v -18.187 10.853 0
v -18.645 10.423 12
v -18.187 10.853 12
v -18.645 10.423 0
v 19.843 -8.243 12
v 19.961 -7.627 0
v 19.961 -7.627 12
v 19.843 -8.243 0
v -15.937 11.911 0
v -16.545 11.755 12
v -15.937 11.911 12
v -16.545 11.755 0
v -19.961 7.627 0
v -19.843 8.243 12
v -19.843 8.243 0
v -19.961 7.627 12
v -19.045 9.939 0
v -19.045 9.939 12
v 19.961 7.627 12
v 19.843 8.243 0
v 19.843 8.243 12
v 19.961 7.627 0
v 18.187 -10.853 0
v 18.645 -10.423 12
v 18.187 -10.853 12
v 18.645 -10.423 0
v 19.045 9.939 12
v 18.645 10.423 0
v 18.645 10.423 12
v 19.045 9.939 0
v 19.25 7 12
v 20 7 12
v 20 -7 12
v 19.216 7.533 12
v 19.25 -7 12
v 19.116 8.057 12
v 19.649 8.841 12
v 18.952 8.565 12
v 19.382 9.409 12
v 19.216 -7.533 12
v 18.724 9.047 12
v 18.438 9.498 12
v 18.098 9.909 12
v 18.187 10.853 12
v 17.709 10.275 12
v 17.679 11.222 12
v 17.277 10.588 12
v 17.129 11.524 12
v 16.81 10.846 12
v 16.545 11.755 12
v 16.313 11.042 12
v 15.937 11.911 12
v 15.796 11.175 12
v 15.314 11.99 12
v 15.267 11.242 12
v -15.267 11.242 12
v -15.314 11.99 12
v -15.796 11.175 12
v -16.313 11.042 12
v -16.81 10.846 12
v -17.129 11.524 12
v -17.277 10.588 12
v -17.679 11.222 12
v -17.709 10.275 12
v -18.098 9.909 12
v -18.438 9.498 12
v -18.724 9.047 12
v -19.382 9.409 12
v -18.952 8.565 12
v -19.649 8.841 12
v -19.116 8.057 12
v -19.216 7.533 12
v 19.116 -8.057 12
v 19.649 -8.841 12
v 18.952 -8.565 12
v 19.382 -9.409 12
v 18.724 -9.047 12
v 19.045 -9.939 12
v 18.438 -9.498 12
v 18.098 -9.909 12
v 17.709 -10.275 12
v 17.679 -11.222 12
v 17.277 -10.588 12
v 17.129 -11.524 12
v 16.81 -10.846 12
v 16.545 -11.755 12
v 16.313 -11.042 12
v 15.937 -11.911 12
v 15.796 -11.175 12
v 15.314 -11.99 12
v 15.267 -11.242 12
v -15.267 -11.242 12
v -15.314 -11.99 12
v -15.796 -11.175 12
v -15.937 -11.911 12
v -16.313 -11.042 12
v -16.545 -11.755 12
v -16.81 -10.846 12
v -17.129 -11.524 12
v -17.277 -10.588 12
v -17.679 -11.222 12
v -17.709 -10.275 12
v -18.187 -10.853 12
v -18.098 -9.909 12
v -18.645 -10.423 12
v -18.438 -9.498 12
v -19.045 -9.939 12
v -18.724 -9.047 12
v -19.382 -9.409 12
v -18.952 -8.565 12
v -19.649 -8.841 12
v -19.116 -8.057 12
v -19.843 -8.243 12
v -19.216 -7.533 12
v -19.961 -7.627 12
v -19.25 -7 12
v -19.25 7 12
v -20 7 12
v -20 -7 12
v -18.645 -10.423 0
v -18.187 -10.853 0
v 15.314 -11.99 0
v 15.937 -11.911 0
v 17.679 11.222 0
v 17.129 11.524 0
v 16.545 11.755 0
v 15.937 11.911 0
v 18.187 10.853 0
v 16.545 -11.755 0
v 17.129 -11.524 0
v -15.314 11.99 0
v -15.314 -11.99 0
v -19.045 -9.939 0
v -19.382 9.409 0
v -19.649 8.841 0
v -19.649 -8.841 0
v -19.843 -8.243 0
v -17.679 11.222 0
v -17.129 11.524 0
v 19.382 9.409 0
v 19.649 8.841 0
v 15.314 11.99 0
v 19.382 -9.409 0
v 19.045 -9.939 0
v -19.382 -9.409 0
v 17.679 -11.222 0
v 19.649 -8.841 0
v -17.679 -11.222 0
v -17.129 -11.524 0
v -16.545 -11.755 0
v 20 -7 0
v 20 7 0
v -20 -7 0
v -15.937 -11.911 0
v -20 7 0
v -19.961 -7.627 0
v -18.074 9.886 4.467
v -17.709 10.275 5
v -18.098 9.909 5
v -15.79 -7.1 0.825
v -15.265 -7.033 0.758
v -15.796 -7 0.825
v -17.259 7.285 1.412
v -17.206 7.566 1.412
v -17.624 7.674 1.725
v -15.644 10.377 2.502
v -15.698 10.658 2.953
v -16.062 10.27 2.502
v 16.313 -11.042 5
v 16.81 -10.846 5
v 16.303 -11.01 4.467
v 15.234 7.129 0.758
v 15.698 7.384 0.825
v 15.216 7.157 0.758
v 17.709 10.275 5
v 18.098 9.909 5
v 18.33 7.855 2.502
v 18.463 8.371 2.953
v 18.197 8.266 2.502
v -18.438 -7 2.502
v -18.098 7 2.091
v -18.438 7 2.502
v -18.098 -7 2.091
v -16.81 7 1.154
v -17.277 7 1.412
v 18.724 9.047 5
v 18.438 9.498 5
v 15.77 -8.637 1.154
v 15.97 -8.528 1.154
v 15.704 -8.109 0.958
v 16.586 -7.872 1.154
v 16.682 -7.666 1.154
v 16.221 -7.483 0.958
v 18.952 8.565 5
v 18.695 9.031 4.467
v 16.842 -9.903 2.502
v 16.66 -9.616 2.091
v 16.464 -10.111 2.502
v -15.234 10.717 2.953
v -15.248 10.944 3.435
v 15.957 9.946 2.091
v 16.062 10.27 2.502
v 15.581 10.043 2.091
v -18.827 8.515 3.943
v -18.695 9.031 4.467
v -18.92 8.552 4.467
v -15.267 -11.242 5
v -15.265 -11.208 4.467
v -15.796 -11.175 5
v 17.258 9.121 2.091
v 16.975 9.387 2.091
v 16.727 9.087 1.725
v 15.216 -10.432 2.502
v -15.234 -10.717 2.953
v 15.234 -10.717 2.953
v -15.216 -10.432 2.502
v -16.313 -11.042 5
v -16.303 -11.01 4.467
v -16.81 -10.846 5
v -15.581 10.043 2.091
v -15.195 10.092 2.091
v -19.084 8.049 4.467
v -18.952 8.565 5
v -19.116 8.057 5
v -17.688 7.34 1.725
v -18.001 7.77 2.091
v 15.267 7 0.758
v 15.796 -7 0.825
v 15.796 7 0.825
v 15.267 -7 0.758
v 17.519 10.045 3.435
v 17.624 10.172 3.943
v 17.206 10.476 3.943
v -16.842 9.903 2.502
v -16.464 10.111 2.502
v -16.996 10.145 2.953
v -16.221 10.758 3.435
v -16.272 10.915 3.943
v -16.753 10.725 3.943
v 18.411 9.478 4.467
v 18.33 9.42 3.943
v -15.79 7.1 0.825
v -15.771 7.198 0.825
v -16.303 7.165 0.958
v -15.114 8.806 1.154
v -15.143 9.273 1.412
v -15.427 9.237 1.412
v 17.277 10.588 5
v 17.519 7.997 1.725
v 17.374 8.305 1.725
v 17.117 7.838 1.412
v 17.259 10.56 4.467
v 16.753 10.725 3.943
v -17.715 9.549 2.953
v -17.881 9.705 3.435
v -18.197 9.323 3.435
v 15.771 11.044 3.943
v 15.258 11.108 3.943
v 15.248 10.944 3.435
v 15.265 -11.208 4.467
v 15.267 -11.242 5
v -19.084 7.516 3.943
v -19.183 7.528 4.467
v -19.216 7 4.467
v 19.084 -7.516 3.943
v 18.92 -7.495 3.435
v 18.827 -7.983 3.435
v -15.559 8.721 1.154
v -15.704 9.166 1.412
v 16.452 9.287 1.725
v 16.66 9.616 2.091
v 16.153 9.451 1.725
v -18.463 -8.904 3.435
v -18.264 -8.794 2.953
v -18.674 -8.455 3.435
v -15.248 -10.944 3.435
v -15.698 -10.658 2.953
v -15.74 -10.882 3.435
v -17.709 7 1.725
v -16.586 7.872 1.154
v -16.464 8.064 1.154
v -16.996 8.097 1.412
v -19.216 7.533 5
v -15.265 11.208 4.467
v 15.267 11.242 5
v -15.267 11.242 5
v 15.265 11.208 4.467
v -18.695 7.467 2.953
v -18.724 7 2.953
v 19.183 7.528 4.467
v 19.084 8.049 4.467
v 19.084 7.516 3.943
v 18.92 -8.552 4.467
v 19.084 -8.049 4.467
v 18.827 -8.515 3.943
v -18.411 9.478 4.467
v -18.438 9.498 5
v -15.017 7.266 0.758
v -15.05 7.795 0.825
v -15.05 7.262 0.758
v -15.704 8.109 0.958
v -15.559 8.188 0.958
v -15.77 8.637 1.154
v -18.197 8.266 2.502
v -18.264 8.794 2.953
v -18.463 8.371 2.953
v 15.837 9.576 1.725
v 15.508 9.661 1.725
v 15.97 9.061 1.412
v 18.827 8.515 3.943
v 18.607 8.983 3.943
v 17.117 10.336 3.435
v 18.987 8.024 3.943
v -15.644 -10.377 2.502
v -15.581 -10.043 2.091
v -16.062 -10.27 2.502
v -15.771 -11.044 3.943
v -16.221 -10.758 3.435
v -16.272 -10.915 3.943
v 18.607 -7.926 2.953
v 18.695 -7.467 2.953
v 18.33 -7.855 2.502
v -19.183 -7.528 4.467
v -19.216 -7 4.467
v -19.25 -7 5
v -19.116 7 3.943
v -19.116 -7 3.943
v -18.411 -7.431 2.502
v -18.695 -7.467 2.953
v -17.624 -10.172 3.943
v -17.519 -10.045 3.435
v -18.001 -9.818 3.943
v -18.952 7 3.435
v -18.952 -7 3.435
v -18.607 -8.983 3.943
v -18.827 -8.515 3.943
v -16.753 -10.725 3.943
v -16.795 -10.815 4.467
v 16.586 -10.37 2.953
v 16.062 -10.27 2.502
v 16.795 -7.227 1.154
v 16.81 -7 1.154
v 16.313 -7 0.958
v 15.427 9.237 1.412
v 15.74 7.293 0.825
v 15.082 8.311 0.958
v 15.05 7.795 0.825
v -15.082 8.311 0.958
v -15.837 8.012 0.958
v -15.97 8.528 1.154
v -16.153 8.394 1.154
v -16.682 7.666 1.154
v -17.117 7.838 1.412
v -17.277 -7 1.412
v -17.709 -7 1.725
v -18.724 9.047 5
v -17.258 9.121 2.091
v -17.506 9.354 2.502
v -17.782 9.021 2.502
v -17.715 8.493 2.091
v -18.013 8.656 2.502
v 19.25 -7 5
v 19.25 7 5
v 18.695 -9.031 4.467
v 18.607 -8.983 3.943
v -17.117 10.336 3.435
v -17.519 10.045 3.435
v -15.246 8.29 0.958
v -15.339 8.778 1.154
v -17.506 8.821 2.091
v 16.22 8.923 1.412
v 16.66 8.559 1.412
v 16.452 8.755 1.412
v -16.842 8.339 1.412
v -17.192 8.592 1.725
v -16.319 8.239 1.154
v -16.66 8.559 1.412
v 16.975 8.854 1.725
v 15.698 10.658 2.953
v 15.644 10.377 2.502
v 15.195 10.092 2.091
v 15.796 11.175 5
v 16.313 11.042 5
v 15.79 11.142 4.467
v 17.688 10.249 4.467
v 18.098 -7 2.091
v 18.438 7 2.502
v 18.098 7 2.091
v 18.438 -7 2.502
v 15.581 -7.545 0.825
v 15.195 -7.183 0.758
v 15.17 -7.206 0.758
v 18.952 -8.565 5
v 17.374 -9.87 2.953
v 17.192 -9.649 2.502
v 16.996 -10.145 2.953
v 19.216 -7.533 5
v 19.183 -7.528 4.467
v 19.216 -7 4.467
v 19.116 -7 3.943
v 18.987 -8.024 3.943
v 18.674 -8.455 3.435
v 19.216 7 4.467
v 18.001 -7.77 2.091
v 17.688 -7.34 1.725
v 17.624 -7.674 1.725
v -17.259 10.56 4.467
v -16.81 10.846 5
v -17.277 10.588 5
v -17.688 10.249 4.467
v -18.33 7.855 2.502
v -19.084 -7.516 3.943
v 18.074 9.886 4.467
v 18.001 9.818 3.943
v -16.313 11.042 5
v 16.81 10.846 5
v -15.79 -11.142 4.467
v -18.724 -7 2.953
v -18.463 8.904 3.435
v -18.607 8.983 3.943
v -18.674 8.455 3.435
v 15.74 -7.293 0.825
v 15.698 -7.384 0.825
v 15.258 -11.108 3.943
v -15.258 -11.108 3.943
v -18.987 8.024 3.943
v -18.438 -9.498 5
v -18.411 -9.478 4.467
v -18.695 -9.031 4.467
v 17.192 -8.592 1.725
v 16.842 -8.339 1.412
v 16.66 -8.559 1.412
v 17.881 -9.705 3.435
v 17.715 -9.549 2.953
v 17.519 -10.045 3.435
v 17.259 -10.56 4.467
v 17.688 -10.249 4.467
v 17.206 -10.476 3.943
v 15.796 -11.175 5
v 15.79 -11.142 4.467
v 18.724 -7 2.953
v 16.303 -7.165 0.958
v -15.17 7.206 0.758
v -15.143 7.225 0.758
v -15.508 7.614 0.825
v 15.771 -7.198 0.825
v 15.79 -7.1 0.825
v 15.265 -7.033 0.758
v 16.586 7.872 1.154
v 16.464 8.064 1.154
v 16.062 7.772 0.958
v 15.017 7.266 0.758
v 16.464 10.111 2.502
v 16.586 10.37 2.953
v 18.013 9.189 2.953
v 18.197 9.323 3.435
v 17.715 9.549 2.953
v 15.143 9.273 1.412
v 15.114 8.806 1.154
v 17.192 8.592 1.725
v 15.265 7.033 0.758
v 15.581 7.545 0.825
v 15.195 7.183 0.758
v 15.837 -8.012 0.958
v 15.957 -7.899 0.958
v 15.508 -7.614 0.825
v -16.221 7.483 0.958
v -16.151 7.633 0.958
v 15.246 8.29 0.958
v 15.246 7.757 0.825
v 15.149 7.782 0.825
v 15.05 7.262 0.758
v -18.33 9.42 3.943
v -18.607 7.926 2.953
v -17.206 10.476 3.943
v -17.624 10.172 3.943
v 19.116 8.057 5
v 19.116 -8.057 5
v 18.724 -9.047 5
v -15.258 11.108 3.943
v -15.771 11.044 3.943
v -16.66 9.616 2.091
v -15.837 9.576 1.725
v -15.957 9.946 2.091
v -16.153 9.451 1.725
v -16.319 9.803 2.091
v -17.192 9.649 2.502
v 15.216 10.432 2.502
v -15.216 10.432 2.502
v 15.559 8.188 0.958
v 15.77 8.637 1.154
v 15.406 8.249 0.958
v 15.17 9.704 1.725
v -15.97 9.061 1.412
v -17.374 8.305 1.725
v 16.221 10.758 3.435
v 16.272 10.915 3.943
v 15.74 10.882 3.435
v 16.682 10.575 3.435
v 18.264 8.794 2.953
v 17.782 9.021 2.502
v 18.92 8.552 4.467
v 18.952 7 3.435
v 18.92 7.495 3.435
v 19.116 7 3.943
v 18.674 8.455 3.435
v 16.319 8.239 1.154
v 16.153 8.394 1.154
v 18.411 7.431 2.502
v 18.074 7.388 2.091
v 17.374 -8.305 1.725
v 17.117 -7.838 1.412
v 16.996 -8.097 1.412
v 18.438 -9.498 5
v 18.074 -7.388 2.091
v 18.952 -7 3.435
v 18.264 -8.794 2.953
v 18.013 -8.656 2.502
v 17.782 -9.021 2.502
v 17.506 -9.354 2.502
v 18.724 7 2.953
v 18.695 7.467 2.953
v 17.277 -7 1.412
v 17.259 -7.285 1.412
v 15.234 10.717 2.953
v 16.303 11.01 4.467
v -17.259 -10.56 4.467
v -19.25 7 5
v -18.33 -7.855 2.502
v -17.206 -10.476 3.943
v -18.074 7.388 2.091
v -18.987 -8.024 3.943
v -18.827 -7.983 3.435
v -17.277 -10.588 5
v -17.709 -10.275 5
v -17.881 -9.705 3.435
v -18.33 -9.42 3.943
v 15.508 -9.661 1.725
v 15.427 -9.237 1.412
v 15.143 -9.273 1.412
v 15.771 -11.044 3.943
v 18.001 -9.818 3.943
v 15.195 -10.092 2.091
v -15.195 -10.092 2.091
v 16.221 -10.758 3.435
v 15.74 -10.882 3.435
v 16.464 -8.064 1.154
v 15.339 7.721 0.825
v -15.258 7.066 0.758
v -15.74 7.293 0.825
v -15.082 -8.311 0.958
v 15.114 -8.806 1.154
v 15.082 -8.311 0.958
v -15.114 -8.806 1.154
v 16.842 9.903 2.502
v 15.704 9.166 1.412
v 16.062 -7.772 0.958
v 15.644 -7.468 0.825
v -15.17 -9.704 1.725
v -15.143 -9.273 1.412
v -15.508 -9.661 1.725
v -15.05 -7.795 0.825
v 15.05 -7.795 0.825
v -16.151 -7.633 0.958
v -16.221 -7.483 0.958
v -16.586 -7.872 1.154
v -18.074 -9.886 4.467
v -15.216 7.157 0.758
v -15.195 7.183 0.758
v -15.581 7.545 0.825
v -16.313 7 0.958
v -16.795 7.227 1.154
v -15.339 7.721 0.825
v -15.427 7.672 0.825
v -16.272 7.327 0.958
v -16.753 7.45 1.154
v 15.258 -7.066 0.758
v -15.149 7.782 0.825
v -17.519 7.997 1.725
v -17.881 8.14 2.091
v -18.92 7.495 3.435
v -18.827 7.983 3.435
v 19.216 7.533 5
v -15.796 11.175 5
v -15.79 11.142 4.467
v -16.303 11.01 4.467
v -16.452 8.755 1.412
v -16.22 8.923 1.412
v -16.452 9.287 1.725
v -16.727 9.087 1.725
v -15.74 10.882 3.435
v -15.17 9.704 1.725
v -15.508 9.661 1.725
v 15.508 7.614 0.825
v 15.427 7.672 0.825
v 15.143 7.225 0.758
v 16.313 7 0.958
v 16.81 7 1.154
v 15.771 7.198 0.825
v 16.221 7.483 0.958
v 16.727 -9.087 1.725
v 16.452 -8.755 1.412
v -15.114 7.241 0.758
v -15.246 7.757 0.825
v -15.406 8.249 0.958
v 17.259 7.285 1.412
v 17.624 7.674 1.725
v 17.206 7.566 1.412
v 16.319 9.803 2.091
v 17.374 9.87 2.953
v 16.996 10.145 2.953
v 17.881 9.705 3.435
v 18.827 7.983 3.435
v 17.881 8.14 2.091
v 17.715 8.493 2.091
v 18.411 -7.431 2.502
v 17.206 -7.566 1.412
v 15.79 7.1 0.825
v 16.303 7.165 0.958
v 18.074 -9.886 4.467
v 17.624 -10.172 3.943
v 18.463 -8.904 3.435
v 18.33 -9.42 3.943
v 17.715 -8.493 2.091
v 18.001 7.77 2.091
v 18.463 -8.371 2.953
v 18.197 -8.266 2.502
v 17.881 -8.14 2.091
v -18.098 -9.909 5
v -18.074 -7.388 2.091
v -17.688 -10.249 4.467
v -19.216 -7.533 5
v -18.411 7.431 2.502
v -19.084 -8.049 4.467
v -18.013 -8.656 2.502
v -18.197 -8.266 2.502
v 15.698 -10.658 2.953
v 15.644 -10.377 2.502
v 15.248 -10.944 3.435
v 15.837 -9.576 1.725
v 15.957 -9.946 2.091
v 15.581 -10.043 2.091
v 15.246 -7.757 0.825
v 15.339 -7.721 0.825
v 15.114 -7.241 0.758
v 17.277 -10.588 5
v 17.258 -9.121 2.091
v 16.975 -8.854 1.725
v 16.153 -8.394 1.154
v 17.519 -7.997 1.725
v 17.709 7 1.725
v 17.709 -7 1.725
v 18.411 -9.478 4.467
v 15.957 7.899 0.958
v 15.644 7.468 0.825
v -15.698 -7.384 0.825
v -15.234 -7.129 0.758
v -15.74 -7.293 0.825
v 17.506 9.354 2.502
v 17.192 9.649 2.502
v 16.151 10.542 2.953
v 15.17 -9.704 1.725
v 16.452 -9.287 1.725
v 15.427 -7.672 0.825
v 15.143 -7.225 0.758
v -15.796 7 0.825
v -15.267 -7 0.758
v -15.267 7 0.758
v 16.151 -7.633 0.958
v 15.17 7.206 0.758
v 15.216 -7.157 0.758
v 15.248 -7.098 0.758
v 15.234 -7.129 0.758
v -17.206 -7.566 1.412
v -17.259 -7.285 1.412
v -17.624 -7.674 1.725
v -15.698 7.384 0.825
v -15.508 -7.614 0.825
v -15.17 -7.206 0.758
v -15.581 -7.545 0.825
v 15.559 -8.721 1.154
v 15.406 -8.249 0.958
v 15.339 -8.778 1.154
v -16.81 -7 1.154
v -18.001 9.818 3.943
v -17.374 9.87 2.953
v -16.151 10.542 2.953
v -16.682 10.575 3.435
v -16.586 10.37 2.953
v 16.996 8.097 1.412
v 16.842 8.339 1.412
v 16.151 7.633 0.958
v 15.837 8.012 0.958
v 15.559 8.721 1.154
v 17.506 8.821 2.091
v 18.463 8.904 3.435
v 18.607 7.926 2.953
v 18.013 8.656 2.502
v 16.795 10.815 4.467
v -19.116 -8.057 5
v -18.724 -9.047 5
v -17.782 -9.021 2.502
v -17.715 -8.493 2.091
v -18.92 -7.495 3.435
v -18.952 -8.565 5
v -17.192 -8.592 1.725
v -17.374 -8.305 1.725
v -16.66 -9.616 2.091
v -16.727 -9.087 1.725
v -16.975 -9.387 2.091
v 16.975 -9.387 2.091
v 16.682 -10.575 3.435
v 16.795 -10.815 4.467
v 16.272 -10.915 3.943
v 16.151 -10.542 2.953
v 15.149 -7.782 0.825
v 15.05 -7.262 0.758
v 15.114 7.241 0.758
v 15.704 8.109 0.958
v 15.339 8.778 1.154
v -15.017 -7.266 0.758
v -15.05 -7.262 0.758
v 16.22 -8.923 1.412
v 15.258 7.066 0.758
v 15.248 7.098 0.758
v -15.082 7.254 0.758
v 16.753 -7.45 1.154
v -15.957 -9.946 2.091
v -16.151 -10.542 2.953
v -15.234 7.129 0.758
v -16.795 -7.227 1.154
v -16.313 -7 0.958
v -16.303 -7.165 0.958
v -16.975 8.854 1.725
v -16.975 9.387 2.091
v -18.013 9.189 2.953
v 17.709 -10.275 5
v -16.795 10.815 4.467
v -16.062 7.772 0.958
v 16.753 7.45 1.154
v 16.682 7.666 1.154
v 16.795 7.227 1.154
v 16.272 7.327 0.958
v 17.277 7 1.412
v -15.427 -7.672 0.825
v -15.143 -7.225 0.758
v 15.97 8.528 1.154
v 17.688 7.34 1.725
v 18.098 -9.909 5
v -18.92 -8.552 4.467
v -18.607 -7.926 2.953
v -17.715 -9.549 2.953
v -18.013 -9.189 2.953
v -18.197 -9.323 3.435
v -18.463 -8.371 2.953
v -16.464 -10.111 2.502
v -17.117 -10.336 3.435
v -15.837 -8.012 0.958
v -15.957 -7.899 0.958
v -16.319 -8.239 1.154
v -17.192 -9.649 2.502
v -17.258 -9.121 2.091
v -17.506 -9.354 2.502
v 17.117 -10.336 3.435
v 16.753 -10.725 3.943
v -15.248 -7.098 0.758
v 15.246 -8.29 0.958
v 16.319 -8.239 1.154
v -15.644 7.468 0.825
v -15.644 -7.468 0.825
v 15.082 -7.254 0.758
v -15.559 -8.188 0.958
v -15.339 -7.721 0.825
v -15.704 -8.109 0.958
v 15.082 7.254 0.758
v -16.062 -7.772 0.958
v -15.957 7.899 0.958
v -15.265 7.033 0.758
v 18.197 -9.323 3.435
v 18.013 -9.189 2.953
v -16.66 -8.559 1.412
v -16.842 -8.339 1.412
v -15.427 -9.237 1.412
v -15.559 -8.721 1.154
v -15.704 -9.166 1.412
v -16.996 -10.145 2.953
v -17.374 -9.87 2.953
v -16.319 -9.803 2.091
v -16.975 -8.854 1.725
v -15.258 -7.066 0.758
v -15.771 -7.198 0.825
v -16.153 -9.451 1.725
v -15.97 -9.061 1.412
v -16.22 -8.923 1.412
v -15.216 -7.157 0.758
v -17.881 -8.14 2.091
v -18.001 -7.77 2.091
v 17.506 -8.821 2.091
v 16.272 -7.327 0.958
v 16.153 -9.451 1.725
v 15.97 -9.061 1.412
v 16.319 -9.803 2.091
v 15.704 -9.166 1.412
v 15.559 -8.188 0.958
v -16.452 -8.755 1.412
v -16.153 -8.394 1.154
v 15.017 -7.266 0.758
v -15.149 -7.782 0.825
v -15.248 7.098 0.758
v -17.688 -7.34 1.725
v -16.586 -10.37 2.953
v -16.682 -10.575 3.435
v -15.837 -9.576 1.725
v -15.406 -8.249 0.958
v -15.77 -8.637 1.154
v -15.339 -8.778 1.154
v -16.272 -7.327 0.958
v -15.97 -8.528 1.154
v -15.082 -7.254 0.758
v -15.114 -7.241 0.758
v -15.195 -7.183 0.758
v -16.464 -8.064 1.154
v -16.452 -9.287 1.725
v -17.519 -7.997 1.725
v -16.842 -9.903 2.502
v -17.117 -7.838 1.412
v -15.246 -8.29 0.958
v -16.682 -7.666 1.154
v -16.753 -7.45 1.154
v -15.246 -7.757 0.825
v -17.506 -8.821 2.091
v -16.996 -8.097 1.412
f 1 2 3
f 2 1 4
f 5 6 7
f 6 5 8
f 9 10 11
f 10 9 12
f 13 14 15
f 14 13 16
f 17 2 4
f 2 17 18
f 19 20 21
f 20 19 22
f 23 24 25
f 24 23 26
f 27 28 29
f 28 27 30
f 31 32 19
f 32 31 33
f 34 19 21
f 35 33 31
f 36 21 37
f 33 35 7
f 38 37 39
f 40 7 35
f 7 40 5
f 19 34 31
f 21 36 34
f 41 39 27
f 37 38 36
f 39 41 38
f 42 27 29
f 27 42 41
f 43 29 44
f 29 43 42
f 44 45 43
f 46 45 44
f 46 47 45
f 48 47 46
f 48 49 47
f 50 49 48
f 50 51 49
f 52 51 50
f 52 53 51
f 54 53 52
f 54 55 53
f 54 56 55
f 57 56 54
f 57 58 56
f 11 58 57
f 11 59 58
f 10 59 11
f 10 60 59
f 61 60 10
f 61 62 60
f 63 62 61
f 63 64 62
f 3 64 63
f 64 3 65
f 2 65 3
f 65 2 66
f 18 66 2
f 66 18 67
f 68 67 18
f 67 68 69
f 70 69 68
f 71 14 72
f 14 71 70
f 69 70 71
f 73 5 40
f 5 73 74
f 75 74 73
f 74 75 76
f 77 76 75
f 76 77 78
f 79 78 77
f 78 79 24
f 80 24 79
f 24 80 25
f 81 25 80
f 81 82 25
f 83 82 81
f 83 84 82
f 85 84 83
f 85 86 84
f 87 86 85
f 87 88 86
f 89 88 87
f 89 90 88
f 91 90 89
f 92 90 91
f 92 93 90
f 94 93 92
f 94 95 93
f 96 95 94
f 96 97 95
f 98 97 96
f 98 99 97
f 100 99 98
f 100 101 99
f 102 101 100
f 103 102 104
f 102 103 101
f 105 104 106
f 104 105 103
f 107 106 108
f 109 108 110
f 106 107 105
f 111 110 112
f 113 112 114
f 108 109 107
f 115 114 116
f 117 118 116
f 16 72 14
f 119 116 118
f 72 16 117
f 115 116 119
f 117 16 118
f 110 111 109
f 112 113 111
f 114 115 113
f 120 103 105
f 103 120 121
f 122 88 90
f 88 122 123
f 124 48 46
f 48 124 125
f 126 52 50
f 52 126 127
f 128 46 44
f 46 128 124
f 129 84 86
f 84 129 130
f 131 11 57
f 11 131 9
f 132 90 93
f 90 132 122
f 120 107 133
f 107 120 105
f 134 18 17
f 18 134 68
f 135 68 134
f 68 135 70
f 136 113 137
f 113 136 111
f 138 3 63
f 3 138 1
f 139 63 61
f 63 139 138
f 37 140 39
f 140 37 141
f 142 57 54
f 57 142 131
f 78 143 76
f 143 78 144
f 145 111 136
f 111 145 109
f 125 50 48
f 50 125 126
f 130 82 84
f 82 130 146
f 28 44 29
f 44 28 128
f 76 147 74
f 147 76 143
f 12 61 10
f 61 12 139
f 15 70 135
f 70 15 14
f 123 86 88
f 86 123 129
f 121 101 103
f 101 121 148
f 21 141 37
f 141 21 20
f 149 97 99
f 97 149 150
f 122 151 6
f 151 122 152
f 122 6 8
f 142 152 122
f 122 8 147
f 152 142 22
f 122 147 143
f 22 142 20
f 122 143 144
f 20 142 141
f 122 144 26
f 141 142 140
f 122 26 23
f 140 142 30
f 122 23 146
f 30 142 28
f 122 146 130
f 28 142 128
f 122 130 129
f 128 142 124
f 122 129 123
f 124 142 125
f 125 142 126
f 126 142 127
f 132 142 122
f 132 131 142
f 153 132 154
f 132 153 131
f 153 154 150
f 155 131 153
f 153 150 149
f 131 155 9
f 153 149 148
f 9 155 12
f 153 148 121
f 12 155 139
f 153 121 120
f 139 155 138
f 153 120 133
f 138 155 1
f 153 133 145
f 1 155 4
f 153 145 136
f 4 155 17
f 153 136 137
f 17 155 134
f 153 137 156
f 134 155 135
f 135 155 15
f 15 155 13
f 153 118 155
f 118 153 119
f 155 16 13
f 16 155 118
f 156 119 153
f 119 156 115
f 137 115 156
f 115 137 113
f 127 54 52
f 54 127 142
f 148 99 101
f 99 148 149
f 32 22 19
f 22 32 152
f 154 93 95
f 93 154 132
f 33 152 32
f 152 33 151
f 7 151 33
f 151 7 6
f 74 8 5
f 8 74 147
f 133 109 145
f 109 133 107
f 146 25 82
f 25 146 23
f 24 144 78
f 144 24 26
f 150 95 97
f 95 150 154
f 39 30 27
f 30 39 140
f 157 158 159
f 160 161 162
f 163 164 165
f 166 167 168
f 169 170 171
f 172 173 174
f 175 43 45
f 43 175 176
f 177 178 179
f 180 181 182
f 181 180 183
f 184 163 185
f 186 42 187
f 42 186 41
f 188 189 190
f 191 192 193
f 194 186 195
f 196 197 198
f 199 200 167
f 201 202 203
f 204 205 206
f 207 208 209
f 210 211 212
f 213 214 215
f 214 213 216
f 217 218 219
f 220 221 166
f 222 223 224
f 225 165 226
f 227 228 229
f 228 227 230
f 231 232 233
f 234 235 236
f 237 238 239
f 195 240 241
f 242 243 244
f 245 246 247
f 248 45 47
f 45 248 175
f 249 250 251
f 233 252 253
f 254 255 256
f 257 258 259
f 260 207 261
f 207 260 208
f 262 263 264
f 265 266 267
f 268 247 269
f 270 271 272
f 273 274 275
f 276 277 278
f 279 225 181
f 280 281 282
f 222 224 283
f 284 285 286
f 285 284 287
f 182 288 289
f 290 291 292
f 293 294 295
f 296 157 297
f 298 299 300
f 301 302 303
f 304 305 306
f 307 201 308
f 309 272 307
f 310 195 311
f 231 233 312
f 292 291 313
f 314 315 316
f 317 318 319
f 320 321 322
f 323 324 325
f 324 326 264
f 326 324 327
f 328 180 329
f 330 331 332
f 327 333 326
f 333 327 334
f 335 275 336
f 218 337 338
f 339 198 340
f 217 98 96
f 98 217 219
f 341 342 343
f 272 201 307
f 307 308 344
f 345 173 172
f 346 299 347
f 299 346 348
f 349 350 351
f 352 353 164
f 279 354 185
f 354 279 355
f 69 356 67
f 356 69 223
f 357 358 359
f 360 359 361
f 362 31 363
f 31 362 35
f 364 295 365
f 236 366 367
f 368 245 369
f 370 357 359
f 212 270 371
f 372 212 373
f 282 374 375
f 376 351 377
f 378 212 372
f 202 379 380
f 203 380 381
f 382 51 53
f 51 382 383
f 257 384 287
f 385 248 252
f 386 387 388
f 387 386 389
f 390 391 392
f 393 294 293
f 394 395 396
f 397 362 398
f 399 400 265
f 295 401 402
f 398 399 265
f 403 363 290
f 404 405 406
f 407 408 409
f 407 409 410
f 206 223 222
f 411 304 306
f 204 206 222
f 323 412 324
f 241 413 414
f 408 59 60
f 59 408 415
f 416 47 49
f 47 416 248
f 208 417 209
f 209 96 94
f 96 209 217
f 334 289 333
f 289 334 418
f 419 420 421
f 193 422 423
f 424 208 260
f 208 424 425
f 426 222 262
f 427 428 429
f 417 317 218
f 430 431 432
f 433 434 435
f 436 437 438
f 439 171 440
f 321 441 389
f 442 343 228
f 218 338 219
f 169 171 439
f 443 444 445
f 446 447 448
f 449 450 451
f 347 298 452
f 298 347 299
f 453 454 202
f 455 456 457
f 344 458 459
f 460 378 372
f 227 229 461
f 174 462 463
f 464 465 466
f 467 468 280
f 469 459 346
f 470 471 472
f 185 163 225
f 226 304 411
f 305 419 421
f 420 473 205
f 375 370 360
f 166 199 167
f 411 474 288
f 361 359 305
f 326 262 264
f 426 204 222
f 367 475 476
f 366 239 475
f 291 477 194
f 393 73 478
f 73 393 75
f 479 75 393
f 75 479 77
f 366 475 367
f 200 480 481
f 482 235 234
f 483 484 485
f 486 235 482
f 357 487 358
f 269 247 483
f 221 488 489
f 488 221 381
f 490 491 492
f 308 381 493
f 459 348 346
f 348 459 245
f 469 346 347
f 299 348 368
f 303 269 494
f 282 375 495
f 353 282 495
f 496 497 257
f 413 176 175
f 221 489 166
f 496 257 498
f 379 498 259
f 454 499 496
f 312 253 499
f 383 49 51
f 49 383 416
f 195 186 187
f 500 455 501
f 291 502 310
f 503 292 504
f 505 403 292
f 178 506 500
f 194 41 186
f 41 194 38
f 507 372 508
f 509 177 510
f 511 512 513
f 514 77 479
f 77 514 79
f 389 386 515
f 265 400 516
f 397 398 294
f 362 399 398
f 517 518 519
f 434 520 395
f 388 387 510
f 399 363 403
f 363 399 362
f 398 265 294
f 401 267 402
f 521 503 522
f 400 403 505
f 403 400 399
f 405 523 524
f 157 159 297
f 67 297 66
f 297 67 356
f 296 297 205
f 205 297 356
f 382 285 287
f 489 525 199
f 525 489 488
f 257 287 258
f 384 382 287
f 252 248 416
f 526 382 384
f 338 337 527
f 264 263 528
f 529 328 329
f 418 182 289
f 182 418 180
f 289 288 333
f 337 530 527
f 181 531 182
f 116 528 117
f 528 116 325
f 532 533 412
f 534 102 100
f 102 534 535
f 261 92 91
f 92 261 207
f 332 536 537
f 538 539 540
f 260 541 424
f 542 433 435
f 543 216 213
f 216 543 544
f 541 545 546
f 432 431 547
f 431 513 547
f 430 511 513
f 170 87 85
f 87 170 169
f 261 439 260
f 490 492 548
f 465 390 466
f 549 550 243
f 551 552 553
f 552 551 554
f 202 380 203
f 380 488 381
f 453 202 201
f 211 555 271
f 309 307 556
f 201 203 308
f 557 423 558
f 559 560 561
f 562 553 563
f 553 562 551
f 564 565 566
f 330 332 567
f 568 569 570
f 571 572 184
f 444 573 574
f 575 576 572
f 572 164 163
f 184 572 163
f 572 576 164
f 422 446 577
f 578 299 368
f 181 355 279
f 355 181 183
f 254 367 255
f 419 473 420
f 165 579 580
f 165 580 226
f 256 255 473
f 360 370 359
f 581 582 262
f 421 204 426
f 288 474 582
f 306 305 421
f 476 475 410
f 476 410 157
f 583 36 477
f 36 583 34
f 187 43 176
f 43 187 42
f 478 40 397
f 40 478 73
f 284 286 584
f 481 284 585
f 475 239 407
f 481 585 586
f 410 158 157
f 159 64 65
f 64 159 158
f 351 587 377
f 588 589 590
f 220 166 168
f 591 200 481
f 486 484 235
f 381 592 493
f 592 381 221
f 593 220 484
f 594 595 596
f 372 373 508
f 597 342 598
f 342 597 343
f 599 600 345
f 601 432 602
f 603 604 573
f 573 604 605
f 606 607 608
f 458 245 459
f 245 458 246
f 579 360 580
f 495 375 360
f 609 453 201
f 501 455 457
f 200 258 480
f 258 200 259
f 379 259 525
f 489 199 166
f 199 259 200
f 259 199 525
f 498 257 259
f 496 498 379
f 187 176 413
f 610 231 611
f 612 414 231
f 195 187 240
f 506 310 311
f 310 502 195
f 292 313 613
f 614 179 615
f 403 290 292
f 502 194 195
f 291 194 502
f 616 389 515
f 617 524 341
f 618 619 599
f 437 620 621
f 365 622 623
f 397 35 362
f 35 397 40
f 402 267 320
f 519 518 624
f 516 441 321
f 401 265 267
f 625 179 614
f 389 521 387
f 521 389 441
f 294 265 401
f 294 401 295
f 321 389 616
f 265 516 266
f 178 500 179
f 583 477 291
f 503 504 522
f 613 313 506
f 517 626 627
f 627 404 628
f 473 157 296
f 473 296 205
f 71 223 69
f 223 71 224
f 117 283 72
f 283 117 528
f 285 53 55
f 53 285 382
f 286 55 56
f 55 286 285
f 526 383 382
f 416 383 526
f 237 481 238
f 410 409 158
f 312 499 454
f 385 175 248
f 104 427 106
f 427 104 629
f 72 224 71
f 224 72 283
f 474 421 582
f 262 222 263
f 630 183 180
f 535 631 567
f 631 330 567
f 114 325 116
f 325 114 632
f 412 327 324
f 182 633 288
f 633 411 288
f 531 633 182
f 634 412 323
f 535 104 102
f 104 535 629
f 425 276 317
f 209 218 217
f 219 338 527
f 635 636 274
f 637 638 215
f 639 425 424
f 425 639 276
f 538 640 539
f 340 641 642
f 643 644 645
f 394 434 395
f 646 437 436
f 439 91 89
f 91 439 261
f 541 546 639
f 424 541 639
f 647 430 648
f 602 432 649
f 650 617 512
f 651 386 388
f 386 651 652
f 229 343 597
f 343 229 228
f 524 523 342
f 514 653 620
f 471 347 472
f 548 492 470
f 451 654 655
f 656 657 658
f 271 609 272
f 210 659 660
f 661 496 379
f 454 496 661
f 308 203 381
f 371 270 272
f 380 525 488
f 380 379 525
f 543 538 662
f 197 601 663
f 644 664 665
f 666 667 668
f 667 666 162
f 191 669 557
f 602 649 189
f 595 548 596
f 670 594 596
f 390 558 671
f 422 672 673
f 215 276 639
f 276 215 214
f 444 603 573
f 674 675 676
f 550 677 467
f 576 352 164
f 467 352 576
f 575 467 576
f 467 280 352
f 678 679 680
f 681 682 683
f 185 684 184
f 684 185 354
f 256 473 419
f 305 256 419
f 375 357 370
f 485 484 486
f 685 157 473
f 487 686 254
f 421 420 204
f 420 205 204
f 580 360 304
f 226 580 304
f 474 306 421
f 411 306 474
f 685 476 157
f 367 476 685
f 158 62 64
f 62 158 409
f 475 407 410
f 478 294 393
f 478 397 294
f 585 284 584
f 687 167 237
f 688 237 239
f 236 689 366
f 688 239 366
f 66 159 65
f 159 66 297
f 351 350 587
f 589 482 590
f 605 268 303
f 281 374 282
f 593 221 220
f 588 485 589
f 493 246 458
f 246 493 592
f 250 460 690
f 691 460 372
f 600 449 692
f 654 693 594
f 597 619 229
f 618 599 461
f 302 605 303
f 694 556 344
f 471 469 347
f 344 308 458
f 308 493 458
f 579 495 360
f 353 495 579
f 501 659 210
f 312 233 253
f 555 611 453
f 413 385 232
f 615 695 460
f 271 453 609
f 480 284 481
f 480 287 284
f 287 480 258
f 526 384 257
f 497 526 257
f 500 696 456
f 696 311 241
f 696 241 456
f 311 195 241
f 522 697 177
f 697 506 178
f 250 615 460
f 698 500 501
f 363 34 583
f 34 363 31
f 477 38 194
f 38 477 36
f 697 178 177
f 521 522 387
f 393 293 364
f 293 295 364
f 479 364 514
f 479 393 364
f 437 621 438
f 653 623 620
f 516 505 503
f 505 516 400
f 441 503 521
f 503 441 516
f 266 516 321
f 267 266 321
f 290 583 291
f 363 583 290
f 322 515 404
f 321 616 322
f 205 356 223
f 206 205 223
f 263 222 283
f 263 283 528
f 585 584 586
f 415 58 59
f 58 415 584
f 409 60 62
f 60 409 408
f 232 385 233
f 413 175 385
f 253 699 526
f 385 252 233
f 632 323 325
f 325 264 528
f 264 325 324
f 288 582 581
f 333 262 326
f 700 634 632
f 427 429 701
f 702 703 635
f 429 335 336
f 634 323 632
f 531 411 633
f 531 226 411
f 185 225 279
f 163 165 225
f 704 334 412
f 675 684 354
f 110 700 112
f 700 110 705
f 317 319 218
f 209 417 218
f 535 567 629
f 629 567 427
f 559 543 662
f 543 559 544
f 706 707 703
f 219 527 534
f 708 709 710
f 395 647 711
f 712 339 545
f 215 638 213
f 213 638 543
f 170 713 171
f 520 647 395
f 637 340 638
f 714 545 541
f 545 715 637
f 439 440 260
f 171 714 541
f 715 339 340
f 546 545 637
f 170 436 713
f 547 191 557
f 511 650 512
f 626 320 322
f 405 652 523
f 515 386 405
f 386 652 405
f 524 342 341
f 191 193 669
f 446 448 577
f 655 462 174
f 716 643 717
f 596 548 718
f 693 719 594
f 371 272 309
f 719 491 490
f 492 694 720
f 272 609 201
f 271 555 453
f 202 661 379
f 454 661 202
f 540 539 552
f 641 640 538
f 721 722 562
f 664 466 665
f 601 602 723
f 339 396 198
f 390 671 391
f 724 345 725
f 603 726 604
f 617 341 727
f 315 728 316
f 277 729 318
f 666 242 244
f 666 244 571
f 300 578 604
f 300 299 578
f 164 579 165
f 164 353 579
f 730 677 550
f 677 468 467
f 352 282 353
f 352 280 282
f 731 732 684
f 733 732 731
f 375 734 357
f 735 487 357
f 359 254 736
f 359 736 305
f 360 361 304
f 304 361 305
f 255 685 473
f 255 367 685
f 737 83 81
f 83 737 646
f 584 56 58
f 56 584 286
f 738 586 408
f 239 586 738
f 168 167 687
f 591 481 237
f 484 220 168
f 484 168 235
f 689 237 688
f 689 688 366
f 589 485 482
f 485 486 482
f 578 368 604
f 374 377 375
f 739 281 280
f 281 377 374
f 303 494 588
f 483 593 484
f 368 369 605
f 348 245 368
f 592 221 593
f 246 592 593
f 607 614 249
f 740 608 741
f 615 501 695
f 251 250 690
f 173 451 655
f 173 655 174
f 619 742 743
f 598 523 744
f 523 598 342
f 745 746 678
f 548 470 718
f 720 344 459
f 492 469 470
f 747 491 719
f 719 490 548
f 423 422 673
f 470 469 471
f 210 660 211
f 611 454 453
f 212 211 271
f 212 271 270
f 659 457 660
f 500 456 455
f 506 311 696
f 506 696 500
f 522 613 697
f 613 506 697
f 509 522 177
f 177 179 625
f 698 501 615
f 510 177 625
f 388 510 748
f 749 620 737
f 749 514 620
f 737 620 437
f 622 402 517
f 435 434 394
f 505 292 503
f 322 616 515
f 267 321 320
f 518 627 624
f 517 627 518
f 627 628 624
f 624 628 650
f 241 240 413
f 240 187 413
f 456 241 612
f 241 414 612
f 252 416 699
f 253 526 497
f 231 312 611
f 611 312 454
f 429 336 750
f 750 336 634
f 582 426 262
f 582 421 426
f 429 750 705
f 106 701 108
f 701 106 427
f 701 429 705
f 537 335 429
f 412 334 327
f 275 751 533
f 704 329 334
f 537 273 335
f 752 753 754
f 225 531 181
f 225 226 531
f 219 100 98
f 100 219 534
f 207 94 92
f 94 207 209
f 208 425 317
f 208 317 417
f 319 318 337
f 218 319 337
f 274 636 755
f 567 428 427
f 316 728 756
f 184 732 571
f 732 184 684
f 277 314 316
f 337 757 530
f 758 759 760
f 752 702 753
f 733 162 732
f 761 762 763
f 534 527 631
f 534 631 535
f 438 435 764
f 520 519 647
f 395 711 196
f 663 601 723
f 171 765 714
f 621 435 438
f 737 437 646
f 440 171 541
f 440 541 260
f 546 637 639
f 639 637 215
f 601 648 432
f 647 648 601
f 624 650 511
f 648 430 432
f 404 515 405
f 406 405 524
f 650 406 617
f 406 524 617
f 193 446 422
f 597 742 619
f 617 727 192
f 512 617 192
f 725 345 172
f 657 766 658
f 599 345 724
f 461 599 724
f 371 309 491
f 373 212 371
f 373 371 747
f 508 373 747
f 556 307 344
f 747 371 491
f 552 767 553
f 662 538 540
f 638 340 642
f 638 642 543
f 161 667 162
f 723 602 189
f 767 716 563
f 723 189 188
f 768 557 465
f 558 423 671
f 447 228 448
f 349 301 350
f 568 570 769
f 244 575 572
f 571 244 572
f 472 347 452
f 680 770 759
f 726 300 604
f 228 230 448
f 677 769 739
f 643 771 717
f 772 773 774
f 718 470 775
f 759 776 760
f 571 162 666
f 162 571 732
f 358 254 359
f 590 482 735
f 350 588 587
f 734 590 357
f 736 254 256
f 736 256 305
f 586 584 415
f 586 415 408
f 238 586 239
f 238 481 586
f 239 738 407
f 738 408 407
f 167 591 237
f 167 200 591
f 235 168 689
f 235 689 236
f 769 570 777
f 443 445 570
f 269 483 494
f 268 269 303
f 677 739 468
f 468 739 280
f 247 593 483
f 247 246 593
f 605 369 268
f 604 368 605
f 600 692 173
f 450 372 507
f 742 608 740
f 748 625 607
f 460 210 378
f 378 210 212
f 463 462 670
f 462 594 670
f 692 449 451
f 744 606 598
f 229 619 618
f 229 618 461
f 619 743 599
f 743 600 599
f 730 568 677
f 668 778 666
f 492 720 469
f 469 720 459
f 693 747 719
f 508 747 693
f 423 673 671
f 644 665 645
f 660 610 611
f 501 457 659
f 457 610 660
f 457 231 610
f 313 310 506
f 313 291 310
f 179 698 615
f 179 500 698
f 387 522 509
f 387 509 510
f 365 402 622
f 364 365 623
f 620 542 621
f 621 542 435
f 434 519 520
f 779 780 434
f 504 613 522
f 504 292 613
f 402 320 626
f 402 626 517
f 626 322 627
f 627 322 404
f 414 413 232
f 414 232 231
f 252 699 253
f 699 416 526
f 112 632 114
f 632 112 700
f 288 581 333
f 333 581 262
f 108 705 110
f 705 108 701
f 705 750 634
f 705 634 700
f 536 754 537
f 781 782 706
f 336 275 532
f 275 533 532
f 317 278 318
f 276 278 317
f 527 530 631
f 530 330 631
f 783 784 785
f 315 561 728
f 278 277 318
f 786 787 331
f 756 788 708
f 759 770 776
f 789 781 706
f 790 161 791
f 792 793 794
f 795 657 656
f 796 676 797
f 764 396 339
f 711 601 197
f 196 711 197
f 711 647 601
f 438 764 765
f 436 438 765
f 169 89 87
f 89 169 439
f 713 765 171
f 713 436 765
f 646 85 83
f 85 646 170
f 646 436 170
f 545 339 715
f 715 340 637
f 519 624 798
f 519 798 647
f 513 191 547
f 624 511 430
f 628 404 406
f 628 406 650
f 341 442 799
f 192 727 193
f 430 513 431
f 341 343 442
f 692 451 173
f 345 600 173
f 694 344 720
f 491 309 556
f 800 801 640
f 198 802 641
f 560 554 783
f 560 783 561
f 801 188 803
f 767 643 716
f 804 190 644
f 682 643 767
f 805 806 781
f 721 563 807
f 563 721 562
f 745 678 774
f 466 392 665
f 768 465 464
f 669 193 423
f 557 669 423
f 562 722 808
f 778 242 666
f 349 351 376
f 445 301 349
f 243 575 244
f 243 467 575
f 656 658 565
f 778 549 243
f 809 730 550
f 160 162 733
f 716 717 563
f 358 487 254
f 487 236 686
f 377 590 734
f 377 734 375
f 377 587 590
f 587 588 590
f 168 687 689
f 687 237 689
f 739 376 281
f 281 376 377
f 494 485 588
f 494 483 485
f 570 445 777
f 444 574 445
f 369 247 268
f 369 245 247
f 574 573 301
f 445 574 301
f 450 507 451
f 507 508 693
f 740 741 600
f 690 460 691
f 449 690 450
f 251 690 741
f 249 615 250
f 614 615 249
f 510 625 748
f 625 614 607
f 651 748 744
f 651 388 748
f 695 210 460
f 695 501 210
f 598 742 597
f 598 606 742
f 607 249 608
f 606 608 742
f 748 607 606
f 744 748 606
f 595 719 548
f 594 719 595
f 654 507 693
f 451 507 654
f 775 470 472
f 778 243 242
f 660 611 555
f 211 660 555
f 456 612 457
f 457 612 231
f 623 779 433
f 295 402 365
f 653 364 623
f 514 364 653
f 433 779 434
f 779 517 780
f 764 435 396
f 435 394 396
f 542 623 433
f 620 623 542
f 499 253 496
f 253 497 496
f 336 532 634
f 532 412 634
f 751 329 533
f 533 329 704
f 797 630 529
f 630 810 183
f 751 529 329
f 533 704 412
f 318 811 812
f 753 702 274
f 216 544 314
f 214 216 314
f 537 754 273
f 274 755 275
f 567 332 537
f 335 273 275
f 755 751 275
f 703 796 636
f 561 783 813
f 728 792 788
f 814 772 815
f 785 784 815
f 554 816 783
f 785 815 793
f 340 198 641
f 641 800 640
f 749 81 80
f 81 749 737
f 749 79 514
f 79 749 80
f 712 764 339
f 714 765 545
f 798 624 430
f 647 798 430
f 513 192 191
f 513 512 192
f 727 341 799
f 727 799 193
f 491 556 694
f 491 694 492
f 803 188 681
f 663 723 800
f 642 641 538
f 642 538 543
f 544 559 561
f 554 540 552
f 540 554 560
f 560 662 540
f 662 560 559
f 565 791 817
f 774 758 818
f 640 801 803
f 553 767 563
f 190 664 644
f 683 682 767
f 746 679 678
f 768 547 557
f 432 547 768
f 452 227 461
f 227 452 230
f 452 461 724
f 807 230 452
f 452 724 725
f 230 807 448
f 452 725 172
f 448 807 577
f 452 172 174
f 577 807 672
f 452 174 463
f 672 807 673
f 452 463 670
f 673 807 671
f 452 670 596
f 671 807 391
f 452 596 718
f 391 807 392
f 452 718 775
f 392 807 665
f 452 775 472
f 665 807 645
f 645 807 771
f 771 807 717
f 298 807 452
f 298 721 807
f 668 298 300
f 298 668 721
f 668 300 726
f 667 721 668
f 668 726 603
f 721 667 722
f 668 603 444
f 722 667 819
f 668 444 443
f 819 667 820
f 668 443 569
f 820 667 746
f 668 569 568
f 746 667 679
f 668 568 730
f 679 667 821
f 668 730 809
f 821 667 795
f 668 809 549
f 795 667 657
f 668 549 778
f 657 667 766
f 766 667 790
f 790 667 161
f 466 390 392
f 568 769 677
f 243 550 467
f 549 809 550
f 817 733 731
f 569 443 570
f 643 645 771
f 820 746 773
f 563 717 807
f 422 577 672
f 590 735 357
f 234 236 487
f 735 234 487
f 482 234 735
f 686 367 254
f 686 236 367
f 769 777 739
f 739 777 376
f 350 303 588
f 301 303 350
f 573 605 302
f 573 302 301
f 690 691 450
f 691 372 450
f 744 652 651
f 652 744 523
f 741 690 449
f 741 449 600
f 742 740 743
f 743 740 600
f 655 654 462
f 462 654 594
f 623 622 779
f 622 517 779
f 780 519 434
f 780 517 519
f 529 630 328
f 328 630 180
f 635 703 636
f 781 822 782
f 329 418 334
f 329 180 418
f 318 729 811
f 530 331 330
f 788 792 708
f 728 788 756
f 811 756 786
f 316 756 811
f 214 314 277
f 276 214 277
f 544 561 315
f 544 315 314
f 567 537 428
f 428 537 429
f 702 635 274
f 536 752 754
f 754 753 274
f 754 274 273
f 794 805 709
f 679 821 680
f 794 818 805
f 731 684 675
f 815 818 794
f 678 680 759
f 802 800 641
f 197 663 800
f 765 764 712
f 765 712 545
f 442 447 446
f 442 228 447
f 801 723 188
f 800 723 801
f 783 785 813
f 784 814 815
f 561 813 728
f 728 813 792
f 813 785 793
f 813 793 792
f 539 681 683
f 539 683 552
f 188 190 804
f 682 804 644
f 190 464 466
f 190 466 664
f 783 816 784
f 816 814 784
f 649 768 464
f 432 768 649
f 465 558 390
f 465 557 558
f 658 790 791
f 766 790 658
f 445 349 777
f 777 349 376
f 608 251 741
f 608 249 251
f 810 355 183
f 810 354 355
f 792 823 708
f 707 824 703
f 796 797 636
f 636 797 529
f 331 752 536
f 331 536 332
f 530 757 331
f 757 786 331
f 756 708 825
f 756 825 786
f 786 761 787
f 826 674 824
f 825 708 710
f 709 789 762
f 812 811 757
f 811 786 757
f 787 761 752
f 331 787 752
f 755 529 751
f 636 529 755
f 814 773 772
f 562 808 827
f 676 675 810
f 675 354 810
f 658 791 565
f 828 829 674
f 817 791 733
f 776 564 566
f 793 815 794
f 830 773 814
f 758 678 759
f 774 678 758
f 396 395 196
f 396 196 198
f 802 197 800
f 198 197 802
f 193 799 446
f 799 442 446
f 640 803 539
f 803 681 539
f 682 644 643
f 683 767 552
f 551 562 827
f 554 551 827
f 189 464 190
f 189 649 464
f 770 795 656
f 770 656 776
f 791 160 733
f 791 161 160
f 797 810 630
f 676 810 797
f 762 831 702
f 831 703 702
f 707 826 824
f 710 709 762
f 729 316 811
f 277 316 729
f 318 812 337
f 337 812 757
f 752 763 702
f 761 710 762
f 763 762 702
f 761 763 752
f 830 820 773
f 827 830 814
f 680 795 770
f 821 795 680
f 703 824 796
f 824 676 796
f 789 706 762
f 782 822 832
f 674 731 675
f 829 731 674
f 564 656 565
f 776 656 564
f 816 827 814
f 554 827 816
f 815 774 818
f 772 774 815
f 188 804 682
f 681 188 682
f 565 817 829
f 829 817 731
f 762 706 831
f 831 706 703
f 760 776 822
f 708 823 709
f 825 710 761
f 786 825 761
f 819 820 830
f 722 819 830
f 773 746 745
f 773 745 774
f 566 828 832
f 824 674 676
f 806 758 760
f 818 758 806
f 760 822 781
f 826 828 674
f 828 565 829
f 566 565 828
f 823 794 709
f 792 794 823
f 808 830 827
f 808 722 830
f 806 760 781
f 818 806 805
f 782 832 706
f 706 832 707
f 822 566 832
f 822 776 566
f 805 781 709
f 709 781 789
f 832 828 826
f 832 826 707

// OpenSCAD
$fn = 50;

difference() {
	union() {
		difference() {
			hull() {
				translate(v = [-15.0, 7.0, 0]) {
					cylinder(h = 12, r = 5);
				}
				translate(v = [15.0, 7.0, 0]) {
					cylinder(h = 12, r = 5);
				}
				translate(v = [-15.0, -7.0, 0]) {
					cylinder(h = 12, r = 5);
				}
				translate(v = [15.0, -7.0, 0]) {
					cylinder(h = 12, r = 5);
				}
			}
			translate(v = [0, 0, 0.75]) {
				hull() {
					union() {
						translate(v = [-15.0, 7.0, 4.25]) {
							cylinder(h = 103.5, r = 4.25);
						}
						translate(v = [-15.0, 7.0, 4.25]) {
							sphere(r = 4.25);
						}
						translate(v = [-15.0, 7.0, 107.75]) {
							sphere(r = 4.25);
						}
					}
					union() {
						translate(v = [15.0, 7.0, 4.25]) {
							cylinder(h = 103.5, r = 4.25);
						}
						translate(v = [15.0, 7.0, 4.25]) {
							sphere(r = 4.25);
						}
						translate(v = [15.0, 7.0, 107.75]) {
							sphere(r = 4.25);
						}
					}
					union() {
						translate(v = [-15.0, -7.0, 4.25]) {
							cylinder(h = 103.5, r = 4.25);
						}
						translate(v = [-15.0, -7.0, 4.25]) {
							sphere(r = 4.25);
						}
						translate(v = [-15.0, -7.0, 107.75]) {
							sphere(r = 4.25);
						}
					}
					union() {
						translate(v = [15.0, -7.0, 4.25]) {
							cylinder(h = 103.5, r = 4.25);
						}
						translate(v = [15.0, -7.0, 4.25]) {
							sphere(r = 4.25);
						}
						translate(v = [15.0, -7.0, 107.75]) {
							sphere(r = 4.25);
						}
					}
				}
			}
		}
	}
	union();
}
